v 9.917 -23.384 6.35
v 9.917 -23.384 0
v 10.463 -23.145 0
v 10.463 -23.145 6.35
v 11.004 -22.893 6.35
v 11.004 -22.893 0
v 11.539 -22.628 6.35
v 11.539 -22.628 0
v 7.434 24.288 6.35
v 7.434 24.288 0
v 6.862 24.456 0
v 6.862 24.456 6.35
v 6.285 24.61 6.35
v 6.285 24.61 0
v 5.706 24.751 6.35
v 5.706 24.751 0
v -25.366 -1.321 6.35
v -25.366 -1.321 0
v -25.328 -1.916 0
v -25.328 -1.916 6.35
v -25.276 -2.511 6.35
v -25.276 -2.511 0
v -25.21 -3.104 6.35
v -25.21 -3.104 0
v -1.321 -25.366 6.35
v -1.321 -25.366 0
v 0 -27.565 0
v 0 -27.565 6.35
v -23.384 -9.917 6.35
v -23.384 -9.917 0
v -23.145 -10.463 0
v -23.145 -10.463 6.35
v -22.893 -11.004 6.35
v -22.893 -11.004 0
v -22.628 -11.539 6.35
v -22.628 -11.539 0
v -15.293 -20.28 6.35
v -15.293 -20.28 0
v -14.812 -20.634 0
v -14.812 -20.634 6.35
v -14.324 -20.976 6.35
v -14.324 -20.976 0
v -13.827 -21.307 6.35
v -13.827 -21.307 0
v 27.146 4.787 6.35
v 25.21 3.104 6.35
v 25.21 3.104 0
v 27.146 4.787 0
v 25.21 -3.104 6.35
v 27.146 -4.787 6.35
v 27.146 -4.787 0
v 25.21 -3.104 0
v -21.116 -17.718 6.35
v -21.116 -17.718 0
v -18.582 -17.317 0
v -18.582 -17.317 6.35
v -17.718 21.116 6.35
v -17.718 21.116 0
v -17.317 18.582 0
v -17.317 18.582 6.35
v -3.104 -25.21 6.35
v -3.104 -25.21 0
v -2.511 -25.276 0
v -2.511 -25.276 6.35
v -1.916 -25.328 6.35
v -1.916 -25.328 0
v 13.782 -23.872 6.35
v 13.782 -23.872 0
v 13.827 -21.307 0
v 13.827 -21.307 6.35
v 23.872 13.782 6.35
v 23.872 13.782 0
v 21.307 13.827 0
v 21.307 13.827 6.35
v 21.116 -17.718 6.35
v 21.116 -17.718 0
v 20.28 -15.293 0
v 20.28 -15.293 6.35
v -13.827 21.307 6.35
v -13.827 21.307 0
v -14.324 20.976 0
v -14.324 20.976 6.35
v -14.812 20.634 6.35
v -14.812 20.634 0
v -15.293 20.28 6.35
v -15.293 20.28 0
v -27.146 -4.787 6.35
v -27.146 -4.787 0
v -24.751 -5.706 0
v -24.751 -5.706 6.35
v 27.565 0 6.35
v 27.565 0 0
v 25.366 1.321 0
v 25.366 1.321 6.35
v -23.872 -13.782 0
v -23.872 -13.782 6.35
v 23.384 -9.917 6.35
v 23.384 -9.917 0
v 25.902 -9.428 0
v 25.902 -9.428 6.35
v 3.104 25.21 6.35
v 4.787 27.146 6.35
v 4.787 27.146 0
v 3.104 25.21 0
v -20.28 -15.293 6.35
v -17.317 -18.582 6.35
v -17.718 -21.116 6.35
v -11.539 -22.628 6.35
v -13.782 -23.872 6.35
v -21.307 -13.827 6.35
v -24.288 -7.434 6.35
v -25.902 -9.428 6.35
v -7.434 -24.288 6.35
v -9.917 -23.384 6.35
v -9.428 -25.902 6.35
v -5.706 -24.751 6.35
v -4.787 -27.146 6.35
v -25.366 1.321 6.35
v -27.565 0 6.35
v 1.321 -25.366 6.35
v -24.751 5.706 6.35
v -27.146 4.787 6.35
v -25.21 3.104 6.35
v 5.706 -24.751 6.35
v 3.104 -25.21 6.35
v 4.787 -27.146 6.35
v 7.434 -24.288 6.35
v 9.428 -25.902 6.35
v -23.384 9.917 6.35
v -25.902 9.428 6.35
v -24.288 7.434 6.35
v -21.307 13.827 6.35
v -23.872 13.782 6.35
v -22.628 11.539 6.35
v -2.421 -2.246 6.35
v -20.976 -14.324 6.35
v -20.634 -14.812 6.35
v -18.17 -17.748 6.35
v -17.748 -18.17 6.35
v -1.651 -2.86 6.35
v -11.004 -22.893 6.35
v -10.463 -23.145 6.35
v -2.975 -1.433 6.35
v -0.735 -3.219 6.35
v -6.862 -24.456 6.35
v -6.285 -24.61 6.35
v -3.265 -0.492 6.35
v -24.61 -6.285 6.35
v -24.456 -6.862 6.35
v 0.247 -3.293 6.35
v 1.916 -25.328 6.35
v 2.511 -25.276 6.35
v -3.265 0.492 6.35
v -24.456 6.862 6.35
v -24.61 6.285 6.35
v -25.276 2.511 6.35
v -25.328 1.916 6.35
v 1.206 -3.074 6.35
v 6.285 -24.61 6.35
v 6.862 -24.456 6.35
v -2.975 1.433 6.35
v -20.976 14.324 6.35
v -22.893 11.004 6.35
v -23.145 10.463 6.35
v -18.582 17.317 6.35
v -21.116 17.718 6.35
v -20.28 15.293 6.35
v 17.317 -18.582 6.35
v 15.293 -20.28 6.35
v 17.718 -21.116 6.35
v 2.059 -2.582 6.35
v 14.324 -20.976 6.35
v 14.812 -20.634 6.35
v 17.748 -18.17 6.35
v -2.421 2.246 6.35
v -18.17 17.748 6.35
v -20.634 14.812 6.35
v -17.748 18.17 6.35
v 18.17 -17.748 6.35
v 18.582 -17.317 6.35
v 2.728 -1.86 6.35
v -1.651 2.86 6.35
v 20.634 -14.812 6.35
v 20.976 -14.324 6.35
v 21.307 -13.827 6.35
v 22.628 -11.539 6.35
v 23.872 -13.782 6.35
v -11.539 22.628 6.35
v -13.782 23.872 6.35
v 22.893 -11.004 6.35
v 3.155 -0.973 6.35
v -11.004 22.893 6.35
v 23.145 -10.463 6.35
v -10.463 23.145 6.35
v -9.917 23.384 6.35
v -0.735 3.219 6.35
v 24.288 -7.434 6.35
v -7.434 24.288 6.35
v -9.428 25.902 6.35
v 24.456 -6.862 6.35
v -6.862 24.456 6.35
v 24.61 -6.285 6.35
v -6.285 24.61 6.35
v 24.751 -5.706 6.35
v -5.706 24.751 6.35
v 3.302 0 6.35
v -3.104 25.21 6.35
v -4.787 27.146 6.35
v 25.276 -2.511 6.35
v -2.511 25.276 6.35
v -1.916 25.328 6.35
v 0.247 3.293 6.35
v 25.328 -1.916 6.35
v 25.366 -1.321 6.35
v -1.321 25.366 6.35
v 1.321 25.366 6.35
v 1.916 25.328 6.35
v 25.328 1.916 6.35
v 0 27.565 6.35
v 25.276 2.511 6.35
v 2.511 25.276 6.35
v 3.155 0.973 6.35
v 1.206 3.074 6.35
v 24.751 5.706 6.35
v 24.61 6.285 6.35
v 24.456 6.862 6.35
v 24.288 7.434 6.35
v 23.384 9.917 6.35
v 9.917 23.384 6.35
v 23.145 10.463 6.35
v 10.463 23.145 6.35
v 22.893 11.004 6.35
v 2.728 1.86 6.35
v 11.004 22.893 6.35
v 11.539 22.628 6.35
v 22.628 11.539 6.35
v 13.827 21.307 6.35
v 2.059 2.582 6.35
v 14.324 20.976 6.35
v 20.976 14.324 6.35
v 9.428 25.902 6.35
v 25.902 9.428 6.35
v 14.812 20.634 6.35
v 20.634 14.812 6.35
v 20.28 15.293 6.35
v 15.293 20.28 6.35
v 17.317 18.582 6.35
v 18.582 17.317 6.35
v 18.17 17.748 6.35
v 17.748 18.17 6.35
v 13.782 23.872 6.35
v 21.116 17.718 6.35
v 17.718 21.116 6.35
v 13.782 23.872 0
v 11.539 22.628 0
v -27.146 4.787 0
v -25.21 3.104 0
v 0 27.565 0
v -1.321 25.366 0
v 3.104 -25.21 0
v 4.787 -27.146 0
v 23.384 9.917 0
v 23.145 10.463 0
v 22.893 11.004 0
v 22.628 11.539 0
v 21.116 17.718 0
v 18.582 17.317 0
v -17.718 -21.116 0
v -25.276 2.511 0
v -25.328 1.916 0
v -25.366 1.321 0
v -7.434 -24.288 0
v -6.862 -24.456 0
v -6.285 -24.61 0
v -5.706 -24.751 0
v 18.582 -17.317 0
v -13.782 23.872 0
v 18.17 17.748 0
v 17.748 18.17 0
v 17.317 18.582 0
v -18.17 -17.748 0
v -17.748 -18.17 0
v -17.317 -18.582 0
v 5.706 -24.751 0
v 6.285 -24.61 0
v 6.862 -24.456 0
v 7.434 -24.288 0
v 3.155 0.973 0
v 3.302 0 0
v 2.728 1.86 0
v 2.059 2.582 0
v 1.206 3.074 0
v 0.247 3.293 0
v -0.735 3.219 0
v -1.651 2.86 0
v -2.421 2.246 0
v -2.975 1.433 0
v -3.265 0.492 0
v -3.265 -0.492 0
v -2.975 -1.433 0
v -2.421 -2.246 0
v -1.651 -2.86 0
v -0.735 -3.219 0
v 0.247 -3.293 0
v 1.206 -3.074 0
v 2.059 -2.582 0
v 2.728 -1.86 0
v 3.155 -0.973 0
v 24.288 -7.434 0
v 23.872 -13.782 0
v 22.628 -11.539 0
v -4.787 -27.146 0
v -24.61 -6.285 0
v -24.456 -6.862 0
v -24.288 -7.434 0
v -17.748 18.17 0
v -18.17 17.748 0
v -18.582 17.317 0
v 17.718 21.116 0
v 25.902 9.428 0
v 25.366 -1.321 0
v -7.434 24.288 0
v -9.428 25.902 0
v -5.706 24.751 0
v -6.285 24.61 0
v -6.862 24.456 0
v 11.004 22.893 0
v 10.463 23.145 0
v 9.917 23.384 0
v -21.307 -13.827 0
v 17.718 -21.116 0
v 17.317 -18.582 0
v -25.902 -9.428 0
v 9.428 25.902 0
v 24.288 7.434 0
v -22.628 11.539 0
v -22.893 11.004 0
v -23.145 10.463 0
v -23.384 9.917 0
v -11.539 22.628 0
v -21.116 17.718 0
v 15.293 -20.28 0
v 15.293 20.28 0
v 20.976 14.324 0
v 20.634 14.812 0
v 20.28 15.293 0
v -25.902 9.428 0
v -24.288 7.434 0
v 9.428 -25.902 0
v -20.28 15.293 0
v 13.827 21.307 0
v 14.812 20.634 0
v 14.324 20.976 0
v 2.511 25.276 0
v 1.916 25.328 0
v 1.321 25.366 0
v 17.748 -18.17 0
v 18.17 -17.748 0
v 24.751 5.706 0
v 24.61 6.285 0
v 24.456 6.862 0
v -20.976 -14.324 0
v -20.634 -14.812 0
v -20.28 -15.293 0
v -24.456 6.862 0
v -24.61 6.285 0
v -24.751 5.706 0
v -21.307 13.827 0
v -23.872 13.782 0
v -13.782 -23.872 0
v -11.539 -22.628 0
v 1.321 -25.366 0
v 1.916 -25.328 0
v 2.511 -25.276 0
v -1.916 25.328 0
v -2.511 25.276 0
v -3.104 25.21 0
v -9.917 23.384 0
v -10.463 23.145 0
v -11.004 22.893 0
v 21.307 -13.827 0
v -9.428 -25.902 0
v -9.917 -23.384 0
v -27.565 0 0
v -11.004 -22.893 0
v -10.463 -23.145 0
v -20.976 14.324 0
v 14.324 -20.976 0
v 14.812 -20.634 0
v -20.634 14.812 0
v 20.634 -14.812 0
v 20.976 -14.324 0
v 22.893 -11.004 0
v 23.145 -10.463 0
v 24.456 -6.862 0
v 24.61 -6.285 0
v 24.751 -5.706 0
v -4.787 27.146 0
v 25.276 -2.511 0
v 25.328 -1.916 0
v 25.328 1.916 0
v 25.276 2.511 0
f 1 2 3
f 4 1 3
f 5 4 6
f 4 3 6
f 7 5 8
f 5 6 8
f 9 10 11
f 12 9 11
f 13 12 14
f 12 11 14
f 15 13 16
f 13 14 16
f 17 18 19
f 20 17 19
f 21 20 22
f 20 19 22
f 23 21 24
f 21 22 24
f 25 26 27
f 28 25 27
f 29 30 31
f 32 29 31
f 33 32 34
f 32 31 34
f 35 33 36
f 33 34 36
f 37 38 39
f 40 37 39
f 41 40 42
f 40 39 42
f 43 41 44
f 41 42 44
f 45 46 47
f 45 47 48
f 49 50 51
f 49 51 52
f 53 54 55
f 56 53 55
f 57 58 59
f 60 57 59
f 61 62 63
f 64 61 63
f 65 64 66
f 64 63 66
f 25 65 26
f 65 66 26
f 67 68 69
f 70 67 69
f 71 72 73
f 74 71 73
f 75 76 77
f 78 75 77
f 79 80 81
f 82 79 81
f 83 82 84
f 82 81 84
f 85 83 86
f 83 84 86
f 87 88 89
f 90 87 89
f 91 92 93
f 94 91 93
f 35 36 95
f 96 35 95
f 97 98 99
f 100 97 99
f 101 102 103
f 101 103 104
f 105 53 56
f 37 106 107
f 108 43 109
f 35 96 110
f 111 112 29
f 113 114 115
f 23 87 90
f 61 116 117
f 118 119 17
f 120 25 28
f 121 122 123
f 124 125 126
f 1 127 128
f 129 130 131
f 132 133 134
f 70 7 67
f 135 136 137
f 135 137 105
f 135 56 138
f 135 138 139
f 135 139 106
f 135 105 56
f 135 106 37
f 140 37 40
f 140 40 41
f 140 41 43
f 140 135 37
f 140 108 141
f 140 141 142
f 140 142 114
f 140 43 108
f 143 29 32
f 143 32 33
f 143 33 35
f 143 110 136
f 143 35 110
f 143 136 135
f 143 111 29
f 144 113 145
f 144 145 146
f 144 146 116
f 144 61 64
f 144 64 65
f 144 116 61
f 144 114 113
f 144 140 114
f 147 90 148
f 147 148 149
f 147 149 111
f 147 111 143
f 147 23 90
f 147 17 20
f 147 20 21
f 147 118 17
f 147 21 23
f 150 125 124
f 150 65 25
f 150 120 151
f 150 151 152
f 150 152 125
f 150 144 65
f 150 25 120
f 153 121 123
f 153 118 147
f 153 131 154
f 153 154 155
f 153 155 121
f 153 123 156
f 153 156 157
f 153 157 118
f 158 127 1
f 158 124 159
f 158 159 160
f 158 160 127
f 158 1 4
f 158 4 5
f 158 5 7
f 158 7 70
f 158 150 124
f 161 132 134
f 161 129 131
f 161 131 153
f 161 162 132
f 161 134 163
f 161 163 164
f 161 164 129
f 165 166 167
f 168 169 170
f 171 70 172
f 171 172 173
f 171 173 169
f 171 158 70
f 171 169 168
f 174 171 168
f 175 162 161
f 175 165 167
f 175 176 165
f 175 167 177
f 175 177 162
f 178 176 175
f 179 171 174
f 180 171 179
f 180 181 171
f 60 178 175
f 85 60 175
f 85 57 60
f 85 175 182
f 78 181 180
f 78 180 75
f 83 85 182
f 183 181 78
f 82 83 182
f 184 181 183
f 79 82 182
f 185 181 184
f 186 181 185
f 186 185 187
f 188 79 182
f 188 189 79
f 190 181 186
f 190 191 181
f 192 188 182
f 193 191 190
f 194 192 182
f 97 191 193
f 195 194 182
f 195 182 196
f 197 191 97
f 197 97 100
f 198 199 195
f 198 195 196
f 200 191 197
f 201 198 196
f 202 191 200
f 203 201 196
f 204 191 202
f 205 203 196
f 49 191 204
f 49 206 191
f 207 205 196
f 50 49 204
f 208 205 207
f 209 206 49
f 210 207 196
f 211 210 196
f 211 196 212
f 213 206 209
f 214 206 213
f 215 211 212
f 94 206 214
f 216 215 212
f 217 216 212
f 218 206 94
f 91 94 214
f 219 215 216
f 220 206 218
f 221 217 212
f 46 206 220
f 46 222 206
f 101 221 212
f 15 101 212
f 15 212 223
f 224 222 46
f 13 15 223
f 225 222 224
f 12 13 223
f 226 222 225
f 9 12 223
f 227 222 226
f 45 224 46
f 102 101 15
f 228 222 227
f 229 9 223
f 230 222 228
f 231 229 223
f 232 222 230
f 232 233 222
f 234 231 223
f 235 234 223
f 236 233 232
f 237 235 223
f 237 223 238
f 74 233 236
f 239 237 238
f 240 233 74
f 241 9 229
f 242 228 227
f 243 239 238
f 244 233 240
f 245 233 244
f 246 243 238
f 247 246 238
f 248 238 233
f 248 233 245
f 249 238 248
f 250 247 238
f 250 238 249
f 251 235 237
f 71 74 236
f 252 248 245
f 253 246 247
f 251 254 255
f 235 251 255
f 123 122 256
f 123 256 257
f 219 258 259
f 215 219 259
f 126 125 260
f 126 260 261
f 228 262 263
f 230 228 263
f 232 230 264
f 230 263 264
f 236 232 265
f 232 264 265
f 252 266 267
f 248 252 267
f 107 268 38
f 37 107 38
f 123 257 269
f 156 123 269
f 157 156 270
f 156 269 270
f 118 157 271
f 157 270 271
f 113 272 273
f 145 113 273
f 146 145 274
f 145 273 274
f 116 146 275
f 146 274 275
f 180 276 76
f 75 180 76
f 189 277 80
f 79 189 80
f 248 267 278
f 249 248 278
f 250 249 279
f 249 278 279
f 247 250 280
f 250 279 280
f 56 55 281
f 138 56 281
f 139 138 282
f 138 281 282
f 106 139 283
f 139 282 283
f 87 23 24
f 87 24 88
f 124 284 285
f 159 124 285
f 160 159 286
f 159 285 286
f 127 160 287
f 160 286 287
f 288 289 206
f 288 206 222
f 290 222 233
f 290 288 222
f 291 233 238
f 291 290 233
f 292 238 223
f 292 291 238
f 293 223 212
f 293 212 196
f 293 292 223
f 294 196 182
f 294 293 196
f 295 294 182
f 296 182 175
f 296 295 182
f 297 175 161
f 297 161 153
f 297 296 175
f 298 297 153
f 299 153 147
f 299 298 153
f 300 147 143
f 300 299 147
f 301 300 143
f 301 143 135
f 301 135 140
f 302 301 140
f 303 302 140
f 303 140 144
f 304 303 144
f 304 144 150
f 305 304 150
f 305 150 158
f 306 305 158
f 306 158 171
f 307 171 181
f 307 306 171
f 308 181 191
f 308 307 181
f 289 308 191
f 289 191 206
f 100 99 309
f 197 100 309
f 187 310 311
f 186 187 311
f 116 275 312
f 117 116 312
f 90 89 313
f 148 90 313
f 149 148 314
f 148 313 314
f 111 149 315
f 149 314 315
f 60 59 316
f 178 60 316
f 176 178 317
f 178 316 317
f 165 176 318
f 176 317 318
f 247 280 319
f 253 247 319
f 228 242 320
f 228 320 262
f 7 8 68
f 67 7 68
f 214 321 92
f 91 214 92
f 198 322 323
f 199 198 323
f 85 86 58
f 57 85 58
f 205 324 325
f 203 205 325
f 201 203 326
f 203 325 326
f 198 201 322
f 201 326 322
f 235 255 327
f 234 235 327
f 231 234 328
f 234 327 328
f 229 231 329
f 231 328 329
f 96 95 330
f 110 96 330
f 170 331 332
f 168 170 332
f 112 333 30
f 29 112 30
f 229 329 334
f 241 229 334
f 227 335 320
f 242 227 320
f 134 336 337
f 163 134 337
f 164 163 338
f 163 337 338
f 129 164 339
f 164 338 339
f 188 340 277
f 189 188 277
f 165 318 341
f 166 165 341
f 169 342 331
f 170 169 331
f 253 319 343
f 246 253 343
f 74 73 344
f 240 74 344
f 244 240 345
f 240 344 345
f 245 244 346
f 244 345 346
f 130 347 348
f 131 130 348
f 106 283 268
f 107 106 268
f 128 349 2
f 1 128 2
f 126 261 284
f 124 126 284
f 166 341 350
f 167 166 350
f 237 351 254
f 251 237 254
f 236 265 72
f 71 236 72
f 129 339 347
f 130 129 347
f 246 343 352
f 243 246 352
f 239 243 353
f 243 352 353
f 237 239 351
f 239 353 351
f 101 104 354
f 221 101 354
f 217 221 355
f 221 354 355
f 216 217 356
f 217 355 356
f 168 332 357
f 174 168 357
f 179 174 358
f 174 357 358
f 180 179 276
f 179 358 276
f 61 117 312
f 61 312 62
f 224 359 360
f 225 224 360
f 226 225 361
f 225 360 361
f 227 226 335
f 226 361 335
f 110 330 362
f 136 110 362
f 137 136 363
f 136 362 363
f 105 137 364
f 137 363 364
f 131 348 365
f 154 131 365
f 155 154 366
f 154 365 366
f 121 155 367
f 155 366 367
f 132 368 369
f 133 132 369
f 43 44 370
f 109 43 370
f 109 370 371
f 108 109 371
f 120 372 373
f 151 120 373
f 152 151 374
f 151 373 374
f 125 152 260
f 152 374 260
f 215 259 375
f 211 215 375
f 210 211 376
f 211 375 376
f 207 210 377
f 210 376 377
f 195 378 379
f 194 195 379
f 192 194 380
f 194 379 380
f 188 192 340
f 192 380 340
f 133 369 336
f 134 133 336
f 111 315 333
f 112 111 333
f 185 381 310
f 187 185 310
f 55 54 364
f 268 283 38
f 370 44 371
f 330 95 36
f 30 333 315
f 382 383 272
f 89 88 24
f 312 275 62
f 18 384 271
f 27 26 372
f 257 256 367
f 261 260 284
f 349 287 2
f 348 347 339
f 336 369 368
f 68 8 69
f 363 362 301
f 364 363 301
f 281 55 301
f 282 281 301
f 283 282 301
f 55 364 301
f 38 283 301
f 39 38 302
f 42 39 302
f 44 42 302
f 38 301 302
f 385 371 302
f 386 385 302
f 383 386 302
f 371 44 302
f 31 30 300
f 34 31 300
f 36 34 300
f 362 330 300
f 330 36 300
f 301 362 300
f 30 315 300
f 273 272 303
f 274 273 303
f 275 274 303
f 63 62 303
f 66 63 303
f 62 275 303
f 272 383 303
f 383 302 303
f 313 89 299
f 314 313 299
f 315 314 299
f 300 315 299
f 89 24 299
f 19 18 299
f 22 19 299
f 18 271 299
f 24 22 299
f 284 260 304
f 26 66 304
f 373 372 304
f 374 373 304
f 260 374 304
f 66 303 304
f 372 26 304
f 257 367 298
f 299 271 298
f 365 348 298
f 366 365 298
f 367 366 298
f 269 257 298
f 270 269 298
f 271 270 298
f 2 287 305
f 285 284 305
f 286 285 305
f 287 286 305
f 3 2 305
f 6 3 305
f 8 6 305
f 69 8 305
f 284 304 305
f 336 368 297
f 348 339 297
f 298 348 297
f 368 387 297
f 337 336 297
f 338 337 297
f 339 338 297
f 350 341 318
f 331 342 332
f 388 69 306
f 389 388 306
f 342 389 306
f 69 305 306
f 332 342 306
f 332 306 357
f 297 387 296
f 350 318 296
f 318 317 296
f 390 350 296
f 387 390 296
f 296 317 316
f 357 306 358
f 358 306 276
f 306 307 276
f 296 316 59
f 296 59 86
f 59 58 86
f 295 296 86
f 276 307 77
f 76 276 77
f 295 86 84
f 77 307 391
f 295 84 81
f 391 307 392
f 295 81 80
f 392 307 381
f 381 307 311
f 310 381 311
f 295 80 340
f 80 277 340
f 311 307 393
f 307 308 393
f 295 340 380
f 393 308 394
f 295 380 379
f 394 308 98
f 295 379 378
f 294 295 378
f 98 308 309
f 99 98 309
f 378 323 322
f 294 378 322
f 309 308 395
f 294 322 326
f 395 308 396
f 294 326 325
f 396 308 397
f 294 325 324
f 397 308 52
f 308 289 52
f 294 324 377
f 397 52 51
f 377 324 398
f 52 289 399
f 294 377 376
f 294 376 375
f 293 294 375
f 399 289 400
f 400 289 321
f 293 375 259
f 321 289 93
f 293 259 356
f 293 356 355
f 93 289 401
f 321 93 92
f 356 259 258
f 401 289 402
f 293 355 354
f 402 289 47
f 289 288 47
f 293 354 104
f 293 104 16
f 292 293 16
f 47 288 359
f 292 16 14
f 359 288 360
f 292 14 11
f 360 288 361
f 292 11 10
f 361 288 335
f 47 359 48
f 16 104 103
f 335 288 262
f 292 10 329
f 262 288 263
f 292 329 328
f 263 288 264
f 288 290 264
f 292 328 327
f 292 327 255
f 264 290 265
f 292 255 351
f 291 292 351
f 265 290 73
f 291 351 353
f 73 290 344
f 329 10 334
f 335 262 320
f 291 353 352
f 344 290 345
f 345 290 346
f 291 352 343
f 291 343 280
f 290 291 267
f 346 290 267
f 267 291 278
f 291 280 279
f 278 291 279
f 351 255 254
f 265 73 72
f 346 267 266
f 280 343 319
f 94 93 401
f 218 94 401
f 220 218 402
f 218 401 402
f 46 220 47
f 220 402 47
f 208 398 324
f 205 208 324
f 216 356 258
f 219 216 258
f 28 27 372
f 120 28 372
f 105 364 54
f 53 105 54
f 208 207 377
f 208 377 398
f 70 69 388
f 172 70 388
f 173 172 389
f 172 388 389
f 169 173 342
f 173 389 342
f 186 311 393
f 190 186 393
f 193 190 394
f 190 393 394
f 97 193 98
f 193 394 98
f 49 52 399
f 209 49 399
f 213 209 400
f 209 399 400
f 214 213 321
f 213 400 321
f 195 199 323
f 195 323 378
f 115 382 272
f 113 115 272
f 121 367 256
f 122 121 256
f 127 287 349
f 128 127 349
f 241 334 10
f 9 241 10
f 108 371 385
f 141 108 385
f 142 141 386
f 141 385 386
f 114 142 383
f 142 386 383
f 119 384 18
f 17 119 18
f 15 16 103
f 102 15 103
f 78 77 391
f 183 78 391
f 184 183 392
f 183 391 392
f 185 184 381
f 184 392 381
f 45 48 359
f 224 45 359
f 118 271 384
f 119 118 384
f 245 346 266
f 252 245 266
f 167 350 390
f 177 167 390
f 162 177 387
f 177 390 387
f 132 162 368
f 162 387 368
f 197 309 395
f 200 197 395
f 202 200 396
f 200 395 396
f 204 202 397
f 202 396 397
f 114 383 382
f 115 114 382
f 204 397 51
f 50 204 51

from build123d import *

# Parameters (mm, degrees)
F0_R     = 3.302
F1_DEPTH = 6.35


with BuildPart() as f1:
    # F0 (on Top) → F1 (new body)
    with BuildSketch(Plane.XY):
        with BuildLine():
            ThreePointArc((25.365618, -1.321137), (25.391403, -0.660792), (25.4, 0))
            ThreePointArc((25.4, 0), (25.391403, 0.660792), (25.365618, 1.321137))
            ThreePointArc((25.365618, 1.321137), (25.303345, 2.213756), (25.209671, 3.103627))
            ThreePointArc((25.209671, 3.103627), (25.014117, 4.410664), (24.750845, 5.70576))
            ThreePointArc((24.750845, 5.70576), (24.534516, 6.574004), (24.28774, 7.434089))
            ThreePointArc((24.28774, 7.434089), (23.868193, 8.687312), (23.384029, 9.917015))
            ThreePointArc((23.384029, 9.917015), (23.020218, 10.734504), (22.627839, 11.538671))
            ThreePointArc((22.627839, 11.538671), (21.997045, 12.7), (21.306701, 13.826948))
            ThreePointArc((21.306701, 13.826948), (20.806462, 14.568841), (20.280402, 15.292655))
            ThreePointArc((20.280402, 15.292655), (19.457529, 16.326805), (18.58198, 17.316755))
            ThreePointArc((18.58198, 17.316755), (17.960512, 17.960512), (17.316755, 18.58198))
            ThreePointArc((17.316755, 18.58198), (16.326805, 19.457529), (15.292655, 20.280402))
            ThreePointArc((15.292655, 20.280402), (14.568841, 20.806462), (13.826948, 21.306701))
            ThreePointArc((13.826948, 21.306701), (12.7, 21.997045), (11.538671, 22.627839))
            ThreePointArc((11.538671, 22.627839), (10.734504, 23.020218), (9.917015, 23.384029))
            ThreePointArc((9.917015, 23.384029), (8.687312, 23.868193), (7.434089, 24.28774))
            ThreePointArc((7.434089, 24.28774), (6.574004, 24.534516), (5.70576, 24.750845))
            ThreePointArc((5.70576, 24.750845), (4.410664, 25.014117), (3.103627, 25.209671))
            ThreePointArc((3.103627, 25.209671), (2.213756, 25.303345), (1.321137, 25.365618))
            ThreePointArc((1.321137, 25.365618), (0.660792, 25.391403), (0, 25.4))
            ThreePointArc((0, 25.4), (-0.660792, 25.391403), (-1.321137, 25.365618))
            ThreePointArc((-1.321137, 25.365618), (-2.213756, 25.303345), (-3.103627, 25.209671))
            ThreePointArc((-3.103627, 25.209671), (-4.410664, 25.014117), (-5.70576, 24.750845))
            ThreePointArc((-5.70576, 24.750845), (-6.574004, 24.534516), (-7.434089, 24.28774))
            ThreePointArc((-7.434089, 24.28774), (-8.687312, 23.868193), (-9.917015, 23.384029))
            ThreePointArc((-9.917015, 23.384029), (-10.734504, 23.020218), (-11.538671, 22.627839))
            ThreePointArc((-11.538671, 22.627839), (-12.7, 21.997045), (-13.826948, 21.306701))
            ThreePointArc((-13.826948, 21.306701), (-14.568841, 20.806462), (-15.292655, 20.280402))
            ThreePointArc((-15.292655, 20.280402), (-16.326805, 19.457529), (-17.316755, 18.58198))
            ThreePointArc((-17.316755, 18.58198), (-17.960512, 17.960512), (-18.58198, 17.316755))
            ThreePointArc((-18.58198, 17.316755), (-19.457529, 16.326805), (-20.280402, 15.292655))
            ThreePointArc((-20.280402, 15.292655), (-20.806462, 14.568841), (-21.306701, 13.826948))
            ThreePointArc((-21.306701, 13.826948), (-21.997045, 12.7), (-22.627839, 11.538671))
            ThreePointArc((-22.627839, 11.538671), (-23.020218, 10.734504), (-23.384029, 9.917015))
            ThreePointArc((-23.384029, 9.917015), (-23.868193, 8.687312), (-24.28774, 7.434089))
            ThreePointArc((-24.28774, 7.434089), (-24.534516, 6.574004), (-24.750845, 5.70576))
            ThreePointArc((-24.750845, 5.70576), (-25.014117, 4.410664), (-25.209671, 3.103627))
            ThreePointArc((-25.209671, 3.103627), (-25.303345, 2.213756), (-25.365618, 1.321137))
            ThreePointArc((-25.365618, 1.321137), (-25.4, 0), (-25.365618, -1.321137))
            ThreePointArc((-25.365618, -1.321137), (-25.303345, -2.213756), (-25.209671, -3.103627))
            ThreePointArc((-25.209671, -3.103627), (-25.014117, -4.410664), (-24.750845, -5.70576))
            ThreePointArc((-24.750845, -5.70576), (-24.534516, -6.574004), (-24.28774, -7.434089))
            ThreePointArc((-24.28774, -7.434089), (-23.868193, -8.687312), (-23.384029, -9.917015))
            ThreePointArc((-23.384029, -9.917015), (-23.020218, -10.734504), (-22.627839, -11.538671))
            ThreePointArc((-22.627839, -11.538671), (-21.997045, -12.7), (-21.306701, -13.826948))
            ThreePointArc((-21.306701, -13.826948), (-20.806462, -14.568841), (-20.280402, -15.292655))
            ThreePointArc((-20.280402, -15.292655), (-19.457529, -16.326805), (-18.58198, -17.316755))
            ThreePointArc((-18.58198, -17.316755), (-17.960512, -17.960512), (-17.316755, -18.58198))
            ThreePointArc((-17.316755, -18.58198), (-16.326805, -19.457529), (-15.292655, -20.280402))
            ThreePointArc((-15.292655, -20.280402), (-14.568841, -20.806462), (-13.826948, -21.306701))
            ThreePointArc((-13.826948, -21.306701), (-12.7, -21.997045), (-11.538671, -22.627839))
            ThreePointArc((-11.538671, -22.627839), (-10.734504, -23.020218), (-9.917015, -23.384029))
            ThreePointArc((-9.917015, -23.384029), (-8.687312, -23.868193), (-7.434089, -24.28774))
            ThreePointArc((-7.434089, -24.28774), (-6.574004, -24.534516), (-5.70576, -24.750845))
            ThreePointArc((-5.70576, -24.750845), (-4.410664, -25.014117), (-3.103627, -25.209671))
            ThreePointArc((-3.103627, -25.209671), (-2.213756, -25.303345), (-1.321137, -25.365618))
            ThreePointArc((-1.321137, -25.365618), (0, -25.4), (1.321137, -25.365618))
            ThreePointArc((1.321137, -25.365618), (2.213756, -25.303345), (3.103627, -25.209671))
            ThreePointArc((3.103627, -25.209671), (4.410664, -25.014117), (5.70576, -24.750845))
            ThreePointArc((5.70576, -24.750845), (6.574004, -24.534516), (7.434089, -24.28774))
            ThreePointArc((7.434089, -24.28774), (8.687312, -23.868193), (9.917015, -23.384029))
            ThreePointArc((9.917015, -23.384029), (10.734504, -23.020218), (11.538671, -22.627839))
            ThreePointArc((11.538671, -22.627839), (12.7, -21.997045), (13.826948, -21.306701))
            ThreePointArc((13.826948, -21.306701), (14.568841, -20.806462), (15.292655, -20.280402))
            ThreePointArc((15.292655, -20.280402), (16.326805, -19.457529), (17.316755, -18.58198))
            ThreePointArc((17.316755, -18.58198), (17.960512, -17.960512), (18.58198, -17.316755))
            ThreePointArc((18.58198, -17.316755), (19.457529, -16.326805), (20.280402, -15.292655))
            ThreePointArc((20.280402, -15.292655), (20.806462, -14.568841), (21.306701, -13.826948))
            ThreePointArc((21.306701, -13.826948), (21.997045, -12.7), (22.627839, -11.538671))
            ThreePointArc((22.627839, -11.538671), (23.020218, -10.734504), (23.384029, -9.917015))
            ThreePointArc((23.384029, -9.917015), (23.868193, -8.687312), (24.28774, -7.434089))
            ThreePointArc((24.28774, -7.434089), (24.534516, -6.574004), (24.750845, -5.70576))
            ThreePointArc((24.750845, -5.70576), (25.014117, -4.410664), (25.209671, -3.103627))
            ThreePointArc((25.209671, -3.103627), (25.303345, -2.213756), (25.365618, -1.321137))
        make_face()
        Circle(F0_R, mode=Mode.SUBTRACT)
        with BuildLine():
            ThreePointArc((25.365618, 1.321137), (25.391403, 0.660792), (25.4, 0))
            ThreePointArc((25.4, 0), (25.391403, -0.660792), (25.365618, -1.321137))
            Line((25.365618, -1.321137), (27.56468, 0))
            Line((27.56468, 0), (25.365618, 1.321137))
        make_face()
        with BuildLine():
            ThreePointArc((24.750845, 5.70576), (25.014117, 4.410664), (25.209671, 3.103627))
            Line((25.209671, 3.103627), (27.145911, 4.786557))
            Line((27.145911, 4.786557), (24.750845, 5.70576))
        make_face()
        with BuildLine():
            Line((27.145911, -4.786557), (25.209671, -3.103627))
            ThreePointArc((25.209671, -3.103627), (25.014117, -4.410664), (24.750845, -5.70576))
            Line((24.750845, -5.70576), (27.145911, -4.786557))
        make_face()
        with BuildLine():
            ThreePointArc((23.384029, 9.917015), (23.868193, 8.687312), (24.28774, 7.434089))
            Line((24.28774, 7.434089), (25.902327, 9.427676))
            Line((25.902327, 9.427676), (23.384029, 9.917015))
        make_face()
        with BuildLine():
            Line((25.902327, -9.427676), (24.28774, -7.434089))
            ThreePointArc((24.28774, -7.434089), (23.868193, -8.687312), (23.384029, -9.917015))
            Line((23.384029, -9.917015), (25.902327, -9.427676))
        make_face()
        with BuildLine():
            ThreePointArc((21.306701, 13.826948), (21.997045, 12.7), (22.627839, 11.538671))
            Line((22.627839, 11.538671), (23.871713, 13.78234))
            Line((23.871713, 13.78234), (21.306701, 13.826948))
        make_face()
        with BuildLine():
            Line((23.871713, -13.78234), (22.627839, -11.538671))
            ThreePointArc((22.627839, -11.538671), (21.997045, -12.7), (21.306701, -13.826948))
            Line((21.306701, -13.826948), (23.871713, -13.78234))
        make_face()
        with BuildLine():
            ThreePointArc((18.58198, 17.316755), (19.457529, 16.326805), (20.280402, 15.292655))
            Line((20.280402, 15.292655), (21.11577, 17.718235))
            Line((21.11577, 17.718235), (18.58198, 17.316755))
        make_face()
        with BuildLine():
            Line((21.11577, -17.718235), (20.280402, -15.292655))
            ThreePointArc((20.280402, -15.292655), (19.457529, -16.326805), (18.58198, -17.316755))
            Line((18.58198, -17.316755), (21.11577, -17.718235))
        make_face()
        with BuildLine():
            ThreePointArc((15.292655, 20.280402), (16.326805, 19.457529), (17.316755, 18.58198))
            Line((17.316755, 18.58198), (17.718235, 21.11577))
            Line((17.718235, 21.11577), (15.292655, 20.280402))
        make_face()
        with BuildLine():
            Line((17.718235, -21.11577), (17.316755, -18.58198))
            ThreePointArc((17.316755, -18.58198), (16.326805, -19.457529), (15.292655, -20.280402))
            Line((15.292655, -20.280402), (17.718235, -21.11577))
        make_face()
        with BuildLine():
            ThreePointArc((11.538671, 22.627839), (12.7, 21.997045), (13.826948, 21.306701))
            Line((13.826948, 21.306701), (13.78234, 23.871713))
            Line((13.78234, 23.871713), (11.538671, 22.627839))
        make_face()
        with BuildLine():
            Line((13.78234, -23.871713), (13.826948, -21.306701))
            ThreePointArc((13.826948, -21.306701), (12.7, -21.997045), (11.538671, -22.627839))
            Line((11.538671, -22.627839), (13.78234, -23.871713))
        make_face()
        with BuildLine():
            ThreePointArc((7.434089, 24.28774), (8.687312, 23.868193), (9.917015, 23.384029))
            Line((9.917015, 23.384029), (9.427676, 25.902327))
            Line((9.427676, 25.902327), (7.434089, 24.28774))
        make_face()
        with BuildLine():
            Line((9.427676, -25.902327), (9.917015, -23.384029))
            ThreePointArc((9.917015, -23.384029), (8.687312, -23.868193), (7.434089, -24.28774))
            Line((7.434089, -24.28774), (9.427676, -25.902327))
        make_face()
        with BuildLine():
            ThreePointArc((3.103627, 25.209671), (4.410664, 25.014117), (5.70576, 24.750845))
            Line((5.70576, 24.750845), (4.786557, 27.145911))
            Line((4.786557, 27.145911), (3.103627, 25.209671))
        make_face()
        with BuildLine():
            Line((4.786557, -27.145911), (5.70576, -24.750845))
            ThreePointArc((5.70576, -24.750845), (4.410664, -25.014117), (3.103627, -25.209671))
            Line((3.103627, -25.209671), (4.786557, -27.145911))
        make_face()
        with BuildLine():
            ThreePointArc((0, 25.4), (0.660792, 25.391403), (1.321137, 25.365618))
            Line((1.321137, 25.365618), (0, 27.56468))
            Line((0, 27.56468), (0, 25.4))
        make_face()
        with BuildLine():
            Line((0, -27.56468), (1.321137, -25.365618))
            ThreePointArc((1.321137, -25.365618), (0, -25.4), (-1.321137, -25.365618))
            Line((-1.321137, -25.365618), (0, -27.56468))
        make_face()
        with BuildLine():
            ThreePointArc((-1.321137, 25.365618), (-0.660792, 25.391403), (0, 25.4))
            Line((0, 25.4), (0, 27.56468))
            Line((0, 27.56468), (-1.321137, 25.365618))
        make_face()
        with BuildLine():
            Line((-4.786557, -27.145911), (-3.103627, -25.209671))
            ThreePointArc((-3.103627, -25.209671), (-4.410664, -25.014117), (-5.70576, -24.750845))
            Line((-5.70576, -24.750845), (-4.786557, -27.145911))
        make_face()
        with BuildLine():
            ThreePointArc((-5.70576, 24.750845), (-4.410664, 25.014117), (-3.103627, 25.209671))
            Line((-3.103627, 25.209671), (-4.786557, 27.145911))
            Line((-4.786557, 27.145911), (-5.70576, 24.750845))
        make_face()
        with BuildLine():
            Line((-9.427676, -25.902327), (-7.434089, -24.28774))
            ThreePointArc((-7.434089, -24.28774), (-8.687312, -23.868193), (-9.917015, -23.384029))
            Line((-9.917015, -23.384029), (-9.427676, -25.902327))
        make_face()
        with BuildLine():
            ThreePointArc((-9.917015, 23.384029), (-8.687312, 23.868193), (-7.434089, 24.28774))
            Line((-7.434089, 24.28774), (-9.427676, 25.902327))
            Line((-9.427676, 25.902327), (-9.917015, 23.384029))
        make_face()
        with BuildLine():
            Line((-13.78234, -23.871713), (-11.538671, -22.627839))
            ThreePointArc((-11.538671, -22.627839), (-12.7, -21.997045), (-13.826948, -21.306701))
            Line((-13.826948, -21.306701), (-13.78234, -23.871713))
        make_face()
        with BuildLine():
            ThreePointArc((-13.826948, 21.306701), (-12.7, 21.997045), (-11.538671, 22.627839))
            Line((-11.538671, 22.627839), (-13.78234, 23.871713))
            Line((-13.78234, 23.871713), (-13.826948, 21.306701))
        make_face()
        with BuildLine():
            Line((-17.718235, -21.11577), (-15.292655, -20.280402))
            ThreePointArc((-15.292655, -20.280402), (-16.326805, -19.457529), (-17.316755, -18.58198))
            Line((-17.316755, -18.58198), (-17.718235, -21.11577))
        make_face()
        with BuildLine():
            ThreePointArc((-17.316755, 18.58198), (-16.326805, 19.457529), (-15.292655, 20.280402))
            Line((-15.292655, 20.280402), (-17.718235, 21.11577))
            Line((-17.718235, 21.11577), (-17.316755, 18.58198))
        make_face()
        with BuildLine():
            Line((-21.11577, -17.718235), (-18.58198, -17.316755))
            ThreePointArc((-18.58198, -17.316755), (-19.457529, -16.326805), (-20.280402, -15.292655))
            Line((-20.280402, -15.292655), (-21.11577, -17.718235))
        make_face()
        with BuildLine():
            ThreePointArc((-20.280402, 15.292655), (-19.457529, 16.326805), (-18.58198, 17.316755))
            Line((-18.58198, 17.316755), (-21.11577, 17.718235))
            Line((-21.11577, 17.718235), (-20.280402, 15.292655))
        make_face()
        with BuildLine():
            Line((-23.871713, -13.78234), (-21.306701, -13.826948))
            ThreePointArc((-21.306701, -13.826948), (-21.997045, -12.7), (-22.627839, -11.538671))
            Line((-22.627839, -11.538671), (-23.871713, -13.78234))
        make_face()
        with BuildLine():
            ThreePointArc((-22.627839, 11.538671), (-21.997045, 12.7), (-21.306701, 13.826948))
            Line((-21.306701, 13.826948), (-23.871713, 13.78234))
            Line((-23.871713, 13.78234), (-22.627839, 11.538671))
        make_face()
        with BuildLine():
            Line((-25.902327, -9.427676), (-23.384029, -9.917015))
            ThreePointArc((-23.384029, -9.917015), (-23.868193, -8.687312), (-24.28774, -7.434089))
            Line((-24.28774, -7.434089), (-25.902327, -9.427676))
        make_face()
        with BuildLine():
            ThreePointArc((-24.28774, 7.434089), (-23.868193, 8.687312), (-23.384029, 9.917015))
            Line((-23.384029, 9.917015), (-25.902327, 9.427676))
            Line((-25.902327, 9.427676), (-24.28774, 7.434089))
        make_face()
        with BuildLine():
            Line((-27.145911, -4.786557), (-24.750845, -5.70576))
            ThreePointArc((-24.750845, -5.70576), (-25.014117, -4.410664), (-25.209671, -3.103627))
            Line((-25.209671, -3.103627), (-27.145911, -4.786557))
        make_face()
        with BuildLine():
            ThreePointArc((-25.209671, 3.103627), (-25.014117, 4.410664), (-24.750845, 5.70576))
            Line((-24.750845, 5.70576), (-27.145911, 4.786557))
            Line((-27.145911, 4.786557), (-25.209671, 3.103627))
        make_face()
        with BuildLine():
            Line((-27.56468, 0), (-25.365618, -1.321137))
            ThreePointArc((-25.365618, -1.321137), (-25.4, 0), (-25.365618, 1.321137))
            Line((-25.365618, 1.321137), (-27.56468, 0))
        make_face()
    extrude(amount=F1_DEPTH)


solid = f1.part
